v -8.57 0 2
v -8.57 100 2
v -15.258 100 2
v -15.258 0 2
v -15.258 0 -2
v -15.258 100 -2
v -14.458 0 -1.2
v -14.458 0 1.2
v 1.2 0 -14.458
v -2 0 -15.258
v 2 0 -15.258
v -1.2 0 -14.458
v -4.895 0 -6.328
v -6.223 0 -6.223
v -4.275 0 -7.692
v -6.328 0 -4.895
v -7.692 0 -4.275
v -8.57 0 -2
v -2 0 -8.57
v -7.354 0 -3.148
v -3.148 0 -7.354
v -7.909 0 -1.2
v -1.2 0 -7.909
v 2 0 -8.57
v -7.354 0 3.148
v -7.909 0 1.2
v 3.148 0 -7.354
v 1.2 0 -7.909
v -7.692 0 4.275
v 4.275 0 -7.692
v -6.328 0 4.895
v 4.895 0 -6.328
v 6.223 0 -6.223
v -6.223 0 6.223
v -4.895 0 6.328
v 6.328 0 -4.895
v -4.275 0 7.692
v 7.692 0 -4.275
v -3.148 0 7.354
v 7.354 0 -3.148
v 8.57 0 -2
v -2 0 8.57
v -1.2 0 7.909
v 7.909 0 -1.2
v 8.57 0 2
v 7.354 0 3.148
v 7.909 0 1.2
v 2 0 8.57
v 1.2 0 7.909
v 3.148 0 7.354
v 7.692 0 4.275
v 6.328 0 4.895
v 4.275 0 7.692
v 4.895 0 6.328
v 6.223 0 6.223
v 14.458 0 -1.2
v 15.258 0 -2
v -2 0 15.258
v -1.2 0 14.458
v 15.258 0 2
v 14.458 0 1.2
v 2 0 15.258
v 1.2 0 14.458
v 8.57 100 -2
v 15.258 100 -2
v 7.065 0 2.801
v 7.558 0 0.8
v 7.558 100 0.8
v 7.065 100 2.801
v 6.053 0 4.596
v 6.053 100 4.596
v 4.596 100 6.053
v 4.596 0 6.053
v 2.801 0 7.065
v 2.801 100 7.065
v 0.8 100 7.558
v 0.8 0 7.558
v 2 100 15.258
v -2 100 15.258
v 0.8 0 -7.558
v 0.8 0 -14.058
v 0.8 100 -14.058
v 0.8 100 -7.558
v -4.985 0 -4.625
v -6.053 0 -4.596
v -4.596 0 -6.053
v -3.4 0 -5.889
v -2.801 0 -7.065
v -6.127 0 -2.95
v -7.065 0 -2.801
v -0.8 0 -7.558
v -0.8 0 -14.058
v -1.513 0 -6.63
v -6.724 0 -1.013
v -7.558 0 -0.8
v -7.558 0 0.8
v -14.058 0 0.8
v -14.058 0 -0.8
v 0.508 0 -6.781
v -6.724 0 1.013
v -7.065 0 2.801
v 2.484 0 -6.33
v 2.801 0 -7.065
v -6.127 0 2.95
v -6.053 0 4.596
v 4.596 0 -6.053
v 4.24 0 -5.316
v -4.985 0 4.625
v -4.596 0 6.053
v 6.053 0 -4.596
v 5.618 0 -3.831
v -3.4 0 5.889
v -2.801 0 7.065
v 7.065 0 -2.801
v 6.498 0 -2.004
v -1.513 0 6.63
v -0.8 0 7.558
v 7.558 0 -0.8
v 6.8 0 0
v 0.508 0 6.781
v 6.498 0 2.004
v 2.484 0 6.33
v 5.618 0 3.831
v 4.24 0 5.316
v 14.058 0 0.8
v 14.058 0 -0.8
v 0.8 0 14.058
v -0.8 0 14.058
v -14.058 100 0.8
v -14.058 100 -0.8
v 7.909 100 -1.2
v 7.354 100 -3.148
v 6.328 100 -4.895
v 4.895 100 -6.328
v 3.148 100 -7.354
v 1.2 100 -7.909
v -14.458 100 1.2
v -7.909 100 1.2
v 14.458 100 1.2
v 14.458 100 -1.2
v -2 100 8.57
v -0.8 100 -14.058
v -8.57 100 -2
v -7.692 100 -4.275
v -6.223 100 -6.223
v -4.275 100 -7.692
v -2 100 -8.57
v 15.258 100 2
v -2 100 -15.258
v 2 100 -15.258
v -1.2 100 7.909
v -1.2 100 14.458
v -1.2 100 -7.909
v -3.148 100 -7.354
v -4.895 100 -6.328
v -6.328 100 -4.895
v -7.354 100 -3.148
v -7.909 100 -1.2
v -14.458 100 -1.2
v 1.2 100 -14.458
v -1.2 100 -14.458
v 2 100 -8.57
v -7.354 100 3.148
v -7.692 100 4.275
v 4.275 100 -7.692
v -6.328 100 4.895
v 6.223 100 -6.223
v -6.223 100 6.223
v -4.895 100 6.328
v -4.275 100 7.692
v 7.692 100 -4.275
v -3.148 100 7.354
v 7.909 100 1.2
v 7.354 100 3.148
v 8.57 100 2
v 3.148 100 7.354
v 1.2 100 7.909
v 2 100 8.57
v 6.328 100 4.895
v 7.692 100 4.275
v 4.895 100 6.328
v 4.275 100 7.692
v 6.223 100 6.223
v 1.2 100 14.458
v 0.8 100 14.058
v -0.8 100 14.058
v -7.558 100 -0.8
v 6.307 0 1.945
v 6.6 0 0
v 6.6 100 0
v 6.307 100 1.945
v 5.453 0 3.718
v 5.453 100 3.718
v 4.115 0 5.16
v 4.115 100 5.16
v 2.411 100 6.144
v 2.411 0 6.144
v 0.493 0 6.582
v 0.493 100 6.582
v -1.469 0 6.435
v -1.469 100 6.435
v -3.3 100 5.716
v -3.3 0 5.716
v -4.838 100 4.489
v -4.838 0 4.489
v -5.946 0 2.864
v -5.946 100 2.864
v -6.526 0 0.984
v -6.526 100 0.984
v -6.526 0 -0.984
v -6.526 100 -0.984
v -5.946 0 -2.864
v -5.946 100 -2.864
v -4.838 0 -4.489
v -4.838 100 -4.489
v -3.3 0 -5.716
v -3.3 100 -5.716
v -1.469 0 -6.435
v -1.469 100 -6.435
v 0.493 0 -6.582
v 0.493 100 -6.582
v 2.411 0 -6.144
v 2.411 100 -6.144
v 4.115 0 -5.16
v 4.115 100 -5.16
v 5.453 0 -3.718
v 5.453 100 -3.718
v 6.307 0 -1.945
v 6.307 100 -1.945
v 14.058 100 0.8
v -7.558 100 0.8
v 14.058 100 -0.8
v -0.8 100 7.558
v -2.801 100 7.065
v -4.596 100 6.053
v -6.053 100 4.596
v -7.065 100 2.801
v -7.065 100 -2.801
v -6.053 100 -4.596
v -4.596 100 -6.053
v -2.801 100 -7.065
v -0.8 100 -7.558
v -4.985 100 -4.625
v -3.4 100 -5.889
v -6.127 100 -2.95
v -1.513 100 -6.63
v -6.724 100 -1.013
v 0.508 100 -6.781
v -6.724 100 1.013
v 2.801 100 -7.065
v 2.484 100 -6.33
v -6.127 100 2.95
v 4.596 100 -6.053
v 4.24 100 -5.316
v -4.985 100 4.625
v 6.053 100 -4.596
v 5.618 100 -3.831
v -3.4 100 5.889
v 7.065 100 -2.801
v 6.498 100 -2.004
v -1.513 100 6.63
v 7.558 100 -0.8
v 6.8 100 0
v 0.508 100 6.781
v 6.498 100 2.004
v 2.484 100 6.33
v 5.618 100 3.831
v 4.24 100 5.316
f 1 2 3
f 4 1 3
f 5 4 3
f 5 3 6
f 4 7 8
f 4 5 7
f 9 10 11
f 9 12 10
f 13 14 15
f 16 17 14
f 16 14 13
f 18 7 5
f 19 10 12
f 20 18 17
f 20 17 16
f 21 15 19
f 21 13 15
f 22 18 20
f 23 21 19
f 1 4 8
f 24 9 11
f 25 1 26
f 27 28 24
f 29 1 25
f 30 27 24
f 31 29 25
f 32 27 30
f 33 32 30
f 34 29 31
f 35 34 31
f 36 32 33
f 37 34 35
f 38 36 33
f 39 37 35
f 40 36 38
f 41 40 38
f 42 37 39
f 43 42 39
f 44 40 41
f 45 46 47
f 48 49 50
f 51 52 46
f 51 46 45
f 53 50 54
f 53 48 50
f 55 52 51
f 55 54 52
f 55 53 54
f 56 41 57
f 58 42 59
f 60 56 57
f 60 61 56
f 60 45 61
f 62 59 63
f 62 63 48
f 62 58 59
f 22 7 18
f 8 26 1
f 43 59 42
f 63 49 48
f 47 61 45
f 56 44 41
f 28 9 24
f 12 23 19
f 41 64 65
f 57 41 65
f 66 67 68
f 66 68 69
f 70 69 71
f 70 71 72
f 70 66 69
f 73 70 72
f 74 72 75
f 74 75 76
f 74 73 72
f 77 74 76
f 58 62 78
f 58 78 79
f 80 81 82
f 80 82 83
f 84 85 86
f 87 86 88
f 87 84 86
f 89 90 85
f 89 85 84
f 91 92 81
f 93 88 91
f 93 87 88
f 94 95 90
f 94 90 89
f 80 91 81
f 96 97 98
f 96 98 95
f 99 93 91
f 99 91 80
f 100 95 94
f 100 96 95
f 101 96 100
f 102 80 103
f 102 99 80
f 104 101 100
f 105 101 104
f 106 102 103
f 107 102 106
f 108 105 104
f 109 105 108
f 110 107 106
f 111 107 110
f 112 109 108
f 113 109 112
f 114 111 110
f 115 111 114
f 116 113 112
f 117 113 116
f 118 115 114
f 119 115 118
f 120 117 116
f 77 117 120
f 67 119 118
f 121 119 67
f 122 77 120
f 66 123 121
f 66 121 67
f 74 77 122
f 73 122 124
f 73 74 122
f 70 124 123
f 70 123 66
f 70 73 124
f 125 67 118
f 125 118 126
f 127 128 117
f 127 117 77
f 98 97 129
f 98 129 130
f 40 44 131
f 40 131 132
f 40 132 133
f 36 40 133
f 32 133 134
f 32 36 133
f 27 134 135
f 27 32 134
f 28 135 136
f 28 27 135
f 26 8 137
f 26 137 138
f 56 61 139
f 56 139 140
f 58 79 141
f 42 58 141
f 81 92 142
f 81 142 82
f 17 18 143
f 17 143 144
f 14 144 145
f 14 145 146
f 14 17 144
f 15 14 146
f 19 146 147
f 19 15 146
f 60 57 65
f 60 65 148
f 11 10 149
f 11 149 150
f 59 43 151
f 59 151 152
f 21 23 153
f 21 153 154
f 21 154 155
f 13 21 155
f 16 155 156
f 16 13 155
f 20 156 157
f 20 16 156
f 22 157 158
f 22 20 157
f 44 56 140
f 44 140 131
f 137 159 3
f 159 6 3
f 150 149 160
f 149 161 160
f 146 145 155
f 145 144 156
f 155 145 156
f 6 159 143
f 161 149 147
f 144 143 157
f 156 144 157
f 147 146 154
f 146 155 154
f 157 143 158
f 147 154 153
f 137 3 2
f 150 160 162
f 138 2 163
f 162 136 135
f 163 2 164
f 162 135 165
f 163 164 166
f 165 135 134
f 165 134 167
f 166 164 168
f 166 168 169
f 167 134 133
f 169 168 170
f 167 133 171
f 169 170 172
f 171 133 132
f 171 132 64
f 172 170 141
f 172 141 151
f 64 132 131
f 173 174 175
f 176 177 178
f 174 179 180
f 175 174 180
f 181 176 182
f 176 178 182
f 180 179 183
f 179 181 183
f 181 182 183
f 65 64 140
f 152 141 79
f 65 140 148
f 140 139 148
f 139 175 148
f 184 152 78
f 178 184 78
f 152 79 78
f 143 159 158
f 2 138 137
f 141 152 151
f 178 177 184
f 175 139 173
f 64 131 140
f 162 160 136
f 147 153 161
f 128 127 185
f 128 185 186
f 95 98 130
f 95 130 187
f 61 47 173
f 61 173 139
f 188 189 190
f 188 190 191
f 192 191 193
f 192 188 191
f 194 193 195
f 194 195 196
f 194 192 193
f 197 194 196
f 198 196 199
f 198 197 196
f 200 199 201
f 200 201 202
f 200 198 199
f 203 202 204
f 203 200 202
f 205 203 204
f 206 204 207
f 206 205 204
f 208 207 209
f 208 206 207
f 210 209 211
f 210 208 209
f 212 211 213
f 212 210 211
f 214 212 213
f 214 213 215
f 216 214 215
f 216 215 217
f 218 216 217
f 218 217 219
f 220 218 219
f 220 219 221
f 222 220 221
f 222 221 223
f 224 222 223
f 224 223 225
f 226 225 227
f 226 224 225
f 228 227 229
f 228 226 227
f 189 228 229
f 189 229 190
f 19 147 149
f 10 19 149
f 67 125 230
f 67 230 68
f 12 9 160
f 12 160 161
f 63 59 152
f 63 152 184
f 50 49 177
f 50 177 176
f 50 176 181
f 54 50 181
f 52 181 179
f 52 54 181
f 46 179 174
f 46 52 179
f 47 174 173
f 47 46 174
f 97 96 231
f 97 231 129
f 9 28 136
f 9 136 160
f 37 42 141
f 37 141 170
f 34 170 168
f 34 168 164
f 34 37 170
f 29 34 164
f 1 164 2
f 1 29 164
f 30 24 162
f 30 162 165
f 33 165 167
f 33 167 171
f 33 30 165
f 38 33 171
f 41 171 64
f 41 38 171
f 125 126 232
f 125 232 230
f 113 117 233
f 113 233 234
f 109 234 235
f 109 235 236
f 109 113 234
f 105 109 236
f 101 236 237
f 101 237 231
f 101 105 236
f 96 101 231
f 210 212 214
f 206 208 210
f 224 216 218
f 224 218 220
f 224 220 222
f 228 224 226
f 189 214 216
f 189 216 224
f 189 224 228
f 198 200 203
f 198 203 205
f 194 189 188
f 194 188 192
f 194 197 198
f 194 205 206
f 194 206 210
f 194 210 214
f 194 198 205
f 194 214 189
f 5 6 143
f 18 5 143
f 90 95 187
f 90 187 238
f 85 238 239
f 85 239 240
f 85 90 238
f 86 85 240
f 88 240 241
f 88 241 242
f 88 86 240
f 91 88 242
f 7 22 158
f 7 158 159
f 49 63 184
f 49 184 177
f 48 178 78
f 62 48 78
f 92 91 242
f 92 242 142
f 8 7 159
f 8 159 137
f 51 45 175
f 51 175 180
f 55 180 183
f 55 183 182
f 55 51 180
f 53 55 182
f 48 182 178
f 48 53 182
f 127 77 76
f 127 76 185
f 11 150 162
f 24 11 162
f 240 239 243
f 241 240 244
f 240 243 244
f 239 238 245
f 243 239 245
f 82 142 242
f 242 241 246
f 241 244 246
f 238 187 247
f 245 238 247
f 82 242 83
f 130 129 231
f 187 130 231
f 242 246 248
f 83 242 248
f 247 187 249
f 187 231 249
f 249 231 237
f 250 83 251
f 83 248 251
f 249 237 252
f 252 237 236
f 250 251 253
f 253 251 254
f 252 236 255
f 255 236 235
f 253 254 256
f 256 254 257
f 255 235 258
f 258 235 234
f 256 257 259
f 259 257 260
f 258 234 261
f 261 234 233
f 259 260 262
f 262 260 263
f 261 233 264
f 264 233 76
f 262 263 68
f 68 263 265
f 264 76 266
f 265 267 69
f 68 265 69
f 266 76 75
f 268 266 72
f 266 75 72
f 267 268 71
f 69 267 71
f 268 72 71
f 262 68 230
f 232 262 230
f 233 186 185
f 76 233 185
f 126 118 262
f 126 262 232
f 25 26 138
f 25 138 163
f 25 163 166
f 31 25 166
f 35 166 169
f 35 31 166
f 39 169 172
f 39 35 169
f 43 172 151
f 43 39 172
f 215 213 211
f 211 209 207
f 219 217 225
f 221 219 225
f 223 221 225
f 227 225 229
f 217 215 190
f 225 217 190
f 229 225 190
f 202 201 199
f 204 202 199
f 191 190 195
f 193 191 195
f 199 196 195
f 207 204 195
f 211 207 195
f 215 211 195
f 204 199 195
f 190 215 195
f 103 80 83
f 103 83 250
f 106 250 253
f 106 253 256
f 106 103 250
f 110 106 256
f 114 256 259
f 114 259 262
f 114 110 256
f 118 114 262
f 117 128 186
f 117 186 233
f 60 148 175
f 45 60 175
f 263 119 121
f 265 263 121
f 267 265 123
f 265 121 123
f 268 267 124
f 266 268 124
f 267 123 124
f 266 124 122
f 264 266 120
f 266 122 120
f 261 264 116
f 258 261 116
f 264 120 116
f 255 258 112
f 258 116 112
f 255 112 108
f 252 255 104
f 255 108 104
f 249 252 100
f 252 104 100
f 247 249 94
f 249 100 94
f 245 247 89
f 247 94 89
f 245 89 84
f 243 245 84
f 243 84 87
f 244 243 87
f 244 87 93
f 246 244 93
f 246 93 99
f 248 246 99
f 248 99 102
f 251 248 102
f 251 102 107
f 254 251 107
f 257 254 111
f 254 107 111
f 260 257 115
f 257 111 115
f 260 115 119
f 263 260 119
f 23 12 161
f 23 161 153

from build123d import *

# Parameters (mm, degrees)
F0_R     = 6.6
F1_DEPTH = 100
F0_R_2   = 6.8
F2_DEPTH = 100
F3_DEPTH = 100


with BuildPart() as f1:
    # F0 (on Front) → F1 (new body)
    with BuildSketch(Plane.XZ):
        Circle(F0_R)
    extrude(amount=-F1_DEPTH)


with BuildPart() as f2:
    # F0 (on Front) → F2 (new body)
    with BuildSketch(Plane.XZ):
        with BuildLine():
            ThreePointArc((7.557777, -0.8), (7.589437, -0.400557), (7.6, 0))
            ThreePointArc((7.6, 0), (7.589437, 0.400557), (7.557777, 0.8))
            ThreePointArc((7.557777, 0.8), (5.374012, 5.374012), (0.8, 7.557777))
            ThreePointArc((0.8, 7.557777), (0, 7.6), (-0.8, 7.557777))
            ThreePointArc((-0.8, 7.557777), (-5.374012, 5.374012), (-7.557777, 0.8))
            ThreePointArc((-7.557777, 0.8), (-7.6, 0), (-7.557777, -0.8))
            ThreePointArc((-7.557777, -0.8), (-5.374012, -5.374012), (-0.8, -7.557777))
            ThreePointArc((-0.8, -7.557777), (0, -7.6), (0.8, -7.557777))
            ThreePointArc((0.8, -7.557777), (5.374012, -5.374012), (7.557777, -0.8))
        make_face()
        Circle(F0_R_2, mode=Mode.SUBTRACT)
        with BuildLine():
            ThreePointArc((-0.8, 7.557777), (0, 7.6), (0.8, 7.557777))
            Line((0.8, 7.557777), (0.8, 14.057777))
            Line((0.8, 14.057777), (-0.8, 14.057777))
            Line((-0.8, 14.057777), (-0.8, 7.557777))
        make_face()
        with BuildLine():
            ThreePointArc((7.557777, 0.8), (7.589437, 0.400557), (7.6, 0))
            ThreePointArc((7.6, 0), (7.589437, -0.400557), (7.557777, -0.8))
            Line((7.557777, -0.8), (14.057777, -0.8))
            Line((14.057777, -0.8), (14.057777, 0.8))
            Line((14.057777, 0.8), (7.557777, 0.8))
        make_face()
        with BuildLine():
            ThreePointArc((-7.557777, -0.8), (-7.6, 0), (-7.557777, 0.8))
            Line((-7.557777, 0.8), (-14.057777, 0.8))
            Line((-14.057777, 0.8), (-14.057777, -0.8))
            Line((-14.057777, -0.8), (-7.557777, -0.8))
        make_face()
        with BuildLine():
            Line((0.8, -14.057777), (0.8, -7.557777))
            ThreePointArc((0.8, -7.557777), (0, -7.6), (-0.8, -7.557777))
            Line((-0.8, -7.557777), (-0.8, -14.057777))
            Line((-0.8, -14.057777), (0.8, -14.057777))
        make_face()
    extrude(amount=-F2_DEPTH)


with BuildPart() as f3:
    # F0 (on Front) → F3 (new body)
    with BuildSketch(Plane.XZ):
        with BuildLine():
            ThreePointArc((-2, 8.569714), (-6.22254, 6.22254), (-8.569714, 2))
            Line((-8.569714, 2), (-15.257777, 2))
            Line((-15.257777, 2), (-15.257777, -2))
            Line((-15.257777, -2), (-8.569714, -2))
            ThreePointArc((-8.569714, -2), (-6.22254, -6.22254), (-2, -8.569714))
            Line((-2, -8.569714), (-2, -15.257777))
            Line((-2, -15.257777), (2, -15.257777))
            Line((2, -15.257777), (2, -8.569714))
            ThreePointArc((2, -8.569714), (6.22254, -6.22254), (8.569714, -2))
            Line((8.569714, -2), (15.257777, -2))
            Line((15.257777, -2), (15.257777, 2))
            Line((15.257777, 2), (8.569714, 2))
            ThreePointArc((8.569714, 2), (6.22254, 6.22254), (2, 8.569714))
            Line((2, 8.569714), (2, 15.257777))
            Line((2, 15.257777), (-2, 15.257777))
            Line((-2, 15.257777), (-2, 8.569714))
        make_face()
        with BuildLine():
            Line((-7.909488, -1.2), (-14.457777, -1.2))
            Line((-14.457777, -1.2), (-14.457777, 1.2))
            Line((-14.457777, 1.2), (-7.909488, 1.2))
            ThreePointArc((-7.909488, 1.2), (-5.656854, 5.656854), (-1.2, 7.909488))
            Line((-1.2, 7.909488), (-1.2, 14.457777))
            Line((-1.2, 14.457777), (1.2, 14.457777))
            Line((1.2, 14.457777), (1.2, 7.909488))
            ThreePointArc((1.2, 7.909488), (5.656854, 5.656854), (7.909488, 1.2))
            Line((7.909488, 1.2), (14.457777, 1.2))
            Line((14.457777, 1.2), (14.457777, -1.2))
            Line((14.457777, -1.2), (7.909488, -1.2))
            ThreePointArc((7.909488, -1.2), (5.656854, -5.656854), (1.2, -7.909488))
            Line((1.2, -7.909488), (1.2, -14.457777))
            Line((1.2, -14.457777), (-1.2, -14.457777))
            Line((-1.2, -14.457777), (-1.2, -7.909488))
            ThreePointArc((-1.2, -7.909488), (-5.656854, -5.656854), (-7.909488, -1.2))
        make_face(mode=Mode.SUBTRACT)
    extrude(amount=-F3_DEPTH)


solid = Compound([f1.part, f2.part, f3.part])
